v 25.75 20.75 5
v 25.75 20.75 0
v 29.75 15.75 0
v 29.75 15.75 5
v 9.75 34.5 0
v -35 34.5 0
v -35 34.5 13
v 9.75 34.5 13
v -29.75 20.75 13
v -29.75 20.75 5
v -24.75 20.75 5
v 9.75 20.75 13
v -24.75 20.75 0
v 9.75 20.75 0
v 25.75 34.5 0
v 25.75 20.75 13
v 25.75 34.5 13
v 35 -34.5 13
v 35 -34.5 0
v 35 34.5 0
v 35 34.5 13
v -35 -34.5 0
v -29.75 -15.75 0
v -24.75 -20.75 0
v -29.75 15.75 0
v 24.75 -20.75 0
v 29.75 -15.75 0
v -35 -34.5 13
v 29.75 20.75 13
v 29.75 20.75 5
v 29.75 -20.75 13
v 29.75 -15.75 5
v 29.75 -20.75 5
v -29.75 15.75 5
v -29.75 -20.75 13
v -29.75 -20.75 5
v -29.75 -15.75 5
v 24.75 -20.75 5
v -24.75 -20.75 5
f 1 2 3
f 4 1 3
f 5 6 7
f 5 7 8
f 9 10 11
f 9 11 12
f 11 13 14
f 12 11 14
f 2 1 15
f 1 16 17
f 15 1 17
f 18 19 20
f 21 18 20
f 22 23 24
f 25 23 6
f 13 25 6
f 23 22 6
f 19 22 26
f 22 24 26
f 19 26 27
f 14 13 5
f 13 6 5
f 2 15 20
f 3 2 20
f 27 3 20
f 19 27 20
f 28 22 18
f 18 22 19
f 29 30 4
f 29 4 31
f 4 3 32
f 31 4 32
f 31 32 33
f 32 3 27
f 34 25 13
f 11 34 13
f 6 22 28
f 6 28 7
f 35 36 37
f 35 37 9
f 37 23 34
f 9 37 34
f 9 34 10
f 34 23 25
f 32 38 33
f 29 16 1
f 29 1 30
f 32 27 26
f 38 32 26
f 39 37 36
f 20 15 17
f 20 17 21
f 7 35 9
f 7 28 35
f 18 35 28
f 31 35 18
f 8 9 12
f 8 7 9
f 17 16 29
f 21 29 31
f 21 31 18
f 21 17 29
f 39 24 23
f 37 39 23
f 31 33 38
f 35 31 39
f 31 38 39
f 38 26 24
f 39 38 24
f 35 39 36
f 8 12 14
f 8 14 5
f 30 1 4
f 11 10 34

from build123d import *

# Parameters (mm, degrees)
F0_W     = 70
F0_H     = 69
F1_DEPTH = 13
F2_W     = 59.5
F2_H     = 41.5
F3_DEPTH = 8
F4_W     = 16
F4_H     = 13.75
F5_DEPTH = 13.001
F7_DEPTH = 13.001


with BuildPart() as f1:
    # F0 (on Top) → F1 (new body)
    with BuildSketch(Plane.XY):
        Rectangle(F0_W, F0_H)
    extrude(amount=F1_DEPTH)

    # F2 (on face) → F3 (cut)
    with BuildSketch(Plane.XY.offset(13)):
        Rectangle(F2_W, F2_H)
    extrude(amount=-F3_DEPTH, mode=Mode.SUBTRACT)

    # F4 (on face) → F5 (cut, through all)
    with BuildSketch(Plane.XY.offset(13)):
        with Locations((17.75, 27.625)):
            Rectangle(F4_W, F4_H)
    extrude(amount=-F5_DEPTH, mode=Mode.SUBTRACT)

    # F6 (on face) → F7 (cut, through all)
    with BuildSketch(Plane(origin=(0, 0, 0), x_dir=(1, 0, 0), z_dir=(0, 0, -1))):
        Polygon((-29.75, 15.75), (-29.75, -15.75), (-24.75, -20.75), (25.75, -20.75), (29.75, -15.75), (29.75, 15.75), (24.75, 20.75), (-24.75, 20.75), align=None)
    extrude(amount=-F7_DEPTH, mode=Mode.SUBTRACT)


solid = f1.part
